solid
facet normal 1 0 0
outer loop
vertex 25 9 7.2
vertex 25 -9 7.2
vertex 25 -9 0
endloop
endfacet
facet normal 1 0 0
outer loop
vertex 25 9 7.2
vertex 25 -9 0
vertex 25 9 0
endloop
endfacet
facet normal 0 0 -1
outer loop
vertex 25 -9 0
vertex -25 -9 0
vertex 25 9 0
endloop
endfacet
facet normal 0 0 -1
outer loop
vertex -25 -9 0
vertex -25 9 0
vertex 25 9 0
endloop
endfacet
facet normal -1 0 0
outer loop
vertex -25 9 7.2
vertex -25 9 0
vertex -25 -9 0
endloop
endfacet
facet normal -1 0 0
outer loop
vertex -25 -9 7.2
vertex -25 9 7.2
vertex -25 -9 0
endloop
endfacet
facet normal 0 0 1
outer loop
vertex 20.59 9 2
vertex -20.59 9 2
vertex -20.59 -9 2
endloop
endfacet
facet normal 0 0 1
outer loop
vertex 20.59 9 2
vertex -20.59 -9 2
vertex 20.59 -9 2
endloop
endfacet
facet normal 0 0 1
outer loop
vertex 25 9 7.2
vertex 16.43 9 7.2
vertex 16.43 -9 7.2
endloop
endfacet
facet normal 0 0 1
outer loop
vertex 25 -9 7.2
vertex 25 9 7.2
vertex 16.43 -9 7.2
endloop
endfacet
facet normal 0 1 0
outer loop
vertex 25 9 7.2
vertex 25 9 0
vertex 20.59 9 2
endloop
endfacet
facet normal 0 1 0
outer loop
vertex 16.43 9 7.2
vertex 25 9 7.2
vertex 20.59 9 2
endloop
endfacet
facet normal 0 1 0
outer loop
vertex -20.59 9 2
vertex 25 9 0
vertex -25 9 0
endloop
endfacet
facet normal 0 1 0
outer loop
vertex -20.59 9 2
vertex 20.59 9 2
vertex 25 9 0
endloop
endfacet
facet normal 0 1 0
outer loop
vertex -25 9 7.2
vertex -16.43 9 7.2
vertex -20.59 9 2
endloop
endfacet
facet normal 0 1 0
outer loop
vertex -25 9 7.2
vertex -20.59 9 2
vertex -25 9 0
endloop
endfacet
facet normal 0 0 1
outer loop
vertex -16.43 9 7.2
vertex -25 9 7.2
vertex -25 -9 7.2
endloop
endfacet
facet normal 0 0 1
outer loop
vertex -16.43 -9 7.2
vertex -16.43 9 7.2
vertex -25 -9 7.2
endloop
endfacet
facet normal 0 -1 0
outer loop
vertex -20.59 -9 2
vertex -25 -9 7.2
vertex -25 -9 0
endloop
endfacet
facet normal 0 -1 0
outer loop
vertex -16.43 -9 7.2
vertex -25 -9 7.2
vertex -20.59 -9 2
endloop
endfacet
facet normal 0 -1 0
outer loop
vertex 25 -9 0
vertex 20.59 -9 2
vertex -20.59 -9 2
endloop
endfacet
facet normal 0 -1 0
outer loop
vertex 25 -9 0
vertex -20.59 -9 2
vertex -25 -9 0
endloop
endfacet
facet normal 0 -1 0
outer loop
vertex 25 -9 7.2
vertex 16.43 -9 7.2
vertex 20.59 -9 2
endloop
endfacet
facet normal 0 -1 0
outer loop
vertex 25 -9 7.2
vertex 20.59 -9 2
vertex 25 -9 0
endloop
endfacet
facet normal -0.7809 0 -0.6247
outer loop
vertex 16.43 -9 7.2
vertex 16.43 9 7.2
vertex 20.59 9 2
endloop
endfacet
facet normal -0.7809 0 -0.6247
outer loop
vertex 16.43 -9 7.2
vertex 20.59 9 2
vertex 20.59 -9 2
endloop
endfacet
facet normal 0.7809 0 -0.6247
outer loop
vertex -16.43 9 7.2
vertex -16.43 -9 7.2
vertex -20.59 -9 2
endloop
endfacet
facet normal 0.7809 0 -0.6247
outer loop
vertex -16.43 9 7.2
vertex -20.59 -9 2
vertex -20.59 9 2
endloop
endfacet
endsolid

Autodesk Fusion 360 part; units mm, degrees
ref_plane "工作平面1" through (0, 0, 0) normal (0, 0, 1) x (1, 0, 0)
sketch "草图1" plane through (0, 0, 0) normal (0, 0, 1) x (1, 0, 0)
  line L0 (-25, -9) -> (25, -9)
  line L1 (25, -9) -> (25, 9)
  line L2 (25, 9) -> (-25, 9)
  line L3 (-25, 9) -> (-25, -9)
extrude "Coupon base" add sketch "草图1" along normal blind 2
ref_plane "工作平面2" through (0, 0, 2) normal (0, 0, 1) x (1, 0, 0)
sketch "草图2" plane through (0, 0, 2) normal (0, 0, 1) x (1, 0, 0)
  line L0 (-25, -9) -> (-20.59, -9)
  line L1 (-20.59, -9) -> (-20.59, 9)
  line L2 (-20.59, 9) -> (-25, 9)
  line L3 (-25, 9) -> (-25, -9)
ref_plane "工作平面3" through (0, 0, 7.2) normal (0, 0, 1) x (1, 0, 0)
sketch "草图3" plane through (0, 0, 7.2) normal (0, 0, 1) x (1, 0, 0)
  line L0 (-25, -9) -> (-16.43, -9)
  line L1 (-16.43, -9) -> (-16.43, 9)
  line L2 (-16.43, 9) -> (-25, 9)
  line L3 (-25, 9) -> (-25, -9)
loft "Coupon dovetail rail" add profiles "草图2", "草图3" section 1 section 2
ref_plane "工作平面4" through (0, 0, 2) normal (0, 0, 1) x (1, 0, 0)
sketch "草图4" plane through (0, 0, 2) normal (0, 0, 1) x (1, 0, 0)
  line L0 (20.59, -9) -> (25, -9)
  line L1 (25, -9) -> (25, 9)
  line L2 (25, 9) -> (20.59, 9)
  line L3 (20.59, 9) -> (20.59, -9)
ref_plane "工作平面5" through (0, 0, 7.2) normal (0, 0, 1) x (1, 0, 0)
sketch "草图5" plane through (0, 0, 7.2) normal (0, 0, 1) x (1, 0, 0)
  line L0 (16.43, -9) -> (25, -9)
  line L1 (25, -9) -> (25, 9)
  line L2 (25, 9) -> (16.43, 9)
  line L3 (16.43, 9) -> (16.43, -9)
loft "Coupon dovetail rail (1)" add profiles "草图4", "草图5" section 1 section 2
